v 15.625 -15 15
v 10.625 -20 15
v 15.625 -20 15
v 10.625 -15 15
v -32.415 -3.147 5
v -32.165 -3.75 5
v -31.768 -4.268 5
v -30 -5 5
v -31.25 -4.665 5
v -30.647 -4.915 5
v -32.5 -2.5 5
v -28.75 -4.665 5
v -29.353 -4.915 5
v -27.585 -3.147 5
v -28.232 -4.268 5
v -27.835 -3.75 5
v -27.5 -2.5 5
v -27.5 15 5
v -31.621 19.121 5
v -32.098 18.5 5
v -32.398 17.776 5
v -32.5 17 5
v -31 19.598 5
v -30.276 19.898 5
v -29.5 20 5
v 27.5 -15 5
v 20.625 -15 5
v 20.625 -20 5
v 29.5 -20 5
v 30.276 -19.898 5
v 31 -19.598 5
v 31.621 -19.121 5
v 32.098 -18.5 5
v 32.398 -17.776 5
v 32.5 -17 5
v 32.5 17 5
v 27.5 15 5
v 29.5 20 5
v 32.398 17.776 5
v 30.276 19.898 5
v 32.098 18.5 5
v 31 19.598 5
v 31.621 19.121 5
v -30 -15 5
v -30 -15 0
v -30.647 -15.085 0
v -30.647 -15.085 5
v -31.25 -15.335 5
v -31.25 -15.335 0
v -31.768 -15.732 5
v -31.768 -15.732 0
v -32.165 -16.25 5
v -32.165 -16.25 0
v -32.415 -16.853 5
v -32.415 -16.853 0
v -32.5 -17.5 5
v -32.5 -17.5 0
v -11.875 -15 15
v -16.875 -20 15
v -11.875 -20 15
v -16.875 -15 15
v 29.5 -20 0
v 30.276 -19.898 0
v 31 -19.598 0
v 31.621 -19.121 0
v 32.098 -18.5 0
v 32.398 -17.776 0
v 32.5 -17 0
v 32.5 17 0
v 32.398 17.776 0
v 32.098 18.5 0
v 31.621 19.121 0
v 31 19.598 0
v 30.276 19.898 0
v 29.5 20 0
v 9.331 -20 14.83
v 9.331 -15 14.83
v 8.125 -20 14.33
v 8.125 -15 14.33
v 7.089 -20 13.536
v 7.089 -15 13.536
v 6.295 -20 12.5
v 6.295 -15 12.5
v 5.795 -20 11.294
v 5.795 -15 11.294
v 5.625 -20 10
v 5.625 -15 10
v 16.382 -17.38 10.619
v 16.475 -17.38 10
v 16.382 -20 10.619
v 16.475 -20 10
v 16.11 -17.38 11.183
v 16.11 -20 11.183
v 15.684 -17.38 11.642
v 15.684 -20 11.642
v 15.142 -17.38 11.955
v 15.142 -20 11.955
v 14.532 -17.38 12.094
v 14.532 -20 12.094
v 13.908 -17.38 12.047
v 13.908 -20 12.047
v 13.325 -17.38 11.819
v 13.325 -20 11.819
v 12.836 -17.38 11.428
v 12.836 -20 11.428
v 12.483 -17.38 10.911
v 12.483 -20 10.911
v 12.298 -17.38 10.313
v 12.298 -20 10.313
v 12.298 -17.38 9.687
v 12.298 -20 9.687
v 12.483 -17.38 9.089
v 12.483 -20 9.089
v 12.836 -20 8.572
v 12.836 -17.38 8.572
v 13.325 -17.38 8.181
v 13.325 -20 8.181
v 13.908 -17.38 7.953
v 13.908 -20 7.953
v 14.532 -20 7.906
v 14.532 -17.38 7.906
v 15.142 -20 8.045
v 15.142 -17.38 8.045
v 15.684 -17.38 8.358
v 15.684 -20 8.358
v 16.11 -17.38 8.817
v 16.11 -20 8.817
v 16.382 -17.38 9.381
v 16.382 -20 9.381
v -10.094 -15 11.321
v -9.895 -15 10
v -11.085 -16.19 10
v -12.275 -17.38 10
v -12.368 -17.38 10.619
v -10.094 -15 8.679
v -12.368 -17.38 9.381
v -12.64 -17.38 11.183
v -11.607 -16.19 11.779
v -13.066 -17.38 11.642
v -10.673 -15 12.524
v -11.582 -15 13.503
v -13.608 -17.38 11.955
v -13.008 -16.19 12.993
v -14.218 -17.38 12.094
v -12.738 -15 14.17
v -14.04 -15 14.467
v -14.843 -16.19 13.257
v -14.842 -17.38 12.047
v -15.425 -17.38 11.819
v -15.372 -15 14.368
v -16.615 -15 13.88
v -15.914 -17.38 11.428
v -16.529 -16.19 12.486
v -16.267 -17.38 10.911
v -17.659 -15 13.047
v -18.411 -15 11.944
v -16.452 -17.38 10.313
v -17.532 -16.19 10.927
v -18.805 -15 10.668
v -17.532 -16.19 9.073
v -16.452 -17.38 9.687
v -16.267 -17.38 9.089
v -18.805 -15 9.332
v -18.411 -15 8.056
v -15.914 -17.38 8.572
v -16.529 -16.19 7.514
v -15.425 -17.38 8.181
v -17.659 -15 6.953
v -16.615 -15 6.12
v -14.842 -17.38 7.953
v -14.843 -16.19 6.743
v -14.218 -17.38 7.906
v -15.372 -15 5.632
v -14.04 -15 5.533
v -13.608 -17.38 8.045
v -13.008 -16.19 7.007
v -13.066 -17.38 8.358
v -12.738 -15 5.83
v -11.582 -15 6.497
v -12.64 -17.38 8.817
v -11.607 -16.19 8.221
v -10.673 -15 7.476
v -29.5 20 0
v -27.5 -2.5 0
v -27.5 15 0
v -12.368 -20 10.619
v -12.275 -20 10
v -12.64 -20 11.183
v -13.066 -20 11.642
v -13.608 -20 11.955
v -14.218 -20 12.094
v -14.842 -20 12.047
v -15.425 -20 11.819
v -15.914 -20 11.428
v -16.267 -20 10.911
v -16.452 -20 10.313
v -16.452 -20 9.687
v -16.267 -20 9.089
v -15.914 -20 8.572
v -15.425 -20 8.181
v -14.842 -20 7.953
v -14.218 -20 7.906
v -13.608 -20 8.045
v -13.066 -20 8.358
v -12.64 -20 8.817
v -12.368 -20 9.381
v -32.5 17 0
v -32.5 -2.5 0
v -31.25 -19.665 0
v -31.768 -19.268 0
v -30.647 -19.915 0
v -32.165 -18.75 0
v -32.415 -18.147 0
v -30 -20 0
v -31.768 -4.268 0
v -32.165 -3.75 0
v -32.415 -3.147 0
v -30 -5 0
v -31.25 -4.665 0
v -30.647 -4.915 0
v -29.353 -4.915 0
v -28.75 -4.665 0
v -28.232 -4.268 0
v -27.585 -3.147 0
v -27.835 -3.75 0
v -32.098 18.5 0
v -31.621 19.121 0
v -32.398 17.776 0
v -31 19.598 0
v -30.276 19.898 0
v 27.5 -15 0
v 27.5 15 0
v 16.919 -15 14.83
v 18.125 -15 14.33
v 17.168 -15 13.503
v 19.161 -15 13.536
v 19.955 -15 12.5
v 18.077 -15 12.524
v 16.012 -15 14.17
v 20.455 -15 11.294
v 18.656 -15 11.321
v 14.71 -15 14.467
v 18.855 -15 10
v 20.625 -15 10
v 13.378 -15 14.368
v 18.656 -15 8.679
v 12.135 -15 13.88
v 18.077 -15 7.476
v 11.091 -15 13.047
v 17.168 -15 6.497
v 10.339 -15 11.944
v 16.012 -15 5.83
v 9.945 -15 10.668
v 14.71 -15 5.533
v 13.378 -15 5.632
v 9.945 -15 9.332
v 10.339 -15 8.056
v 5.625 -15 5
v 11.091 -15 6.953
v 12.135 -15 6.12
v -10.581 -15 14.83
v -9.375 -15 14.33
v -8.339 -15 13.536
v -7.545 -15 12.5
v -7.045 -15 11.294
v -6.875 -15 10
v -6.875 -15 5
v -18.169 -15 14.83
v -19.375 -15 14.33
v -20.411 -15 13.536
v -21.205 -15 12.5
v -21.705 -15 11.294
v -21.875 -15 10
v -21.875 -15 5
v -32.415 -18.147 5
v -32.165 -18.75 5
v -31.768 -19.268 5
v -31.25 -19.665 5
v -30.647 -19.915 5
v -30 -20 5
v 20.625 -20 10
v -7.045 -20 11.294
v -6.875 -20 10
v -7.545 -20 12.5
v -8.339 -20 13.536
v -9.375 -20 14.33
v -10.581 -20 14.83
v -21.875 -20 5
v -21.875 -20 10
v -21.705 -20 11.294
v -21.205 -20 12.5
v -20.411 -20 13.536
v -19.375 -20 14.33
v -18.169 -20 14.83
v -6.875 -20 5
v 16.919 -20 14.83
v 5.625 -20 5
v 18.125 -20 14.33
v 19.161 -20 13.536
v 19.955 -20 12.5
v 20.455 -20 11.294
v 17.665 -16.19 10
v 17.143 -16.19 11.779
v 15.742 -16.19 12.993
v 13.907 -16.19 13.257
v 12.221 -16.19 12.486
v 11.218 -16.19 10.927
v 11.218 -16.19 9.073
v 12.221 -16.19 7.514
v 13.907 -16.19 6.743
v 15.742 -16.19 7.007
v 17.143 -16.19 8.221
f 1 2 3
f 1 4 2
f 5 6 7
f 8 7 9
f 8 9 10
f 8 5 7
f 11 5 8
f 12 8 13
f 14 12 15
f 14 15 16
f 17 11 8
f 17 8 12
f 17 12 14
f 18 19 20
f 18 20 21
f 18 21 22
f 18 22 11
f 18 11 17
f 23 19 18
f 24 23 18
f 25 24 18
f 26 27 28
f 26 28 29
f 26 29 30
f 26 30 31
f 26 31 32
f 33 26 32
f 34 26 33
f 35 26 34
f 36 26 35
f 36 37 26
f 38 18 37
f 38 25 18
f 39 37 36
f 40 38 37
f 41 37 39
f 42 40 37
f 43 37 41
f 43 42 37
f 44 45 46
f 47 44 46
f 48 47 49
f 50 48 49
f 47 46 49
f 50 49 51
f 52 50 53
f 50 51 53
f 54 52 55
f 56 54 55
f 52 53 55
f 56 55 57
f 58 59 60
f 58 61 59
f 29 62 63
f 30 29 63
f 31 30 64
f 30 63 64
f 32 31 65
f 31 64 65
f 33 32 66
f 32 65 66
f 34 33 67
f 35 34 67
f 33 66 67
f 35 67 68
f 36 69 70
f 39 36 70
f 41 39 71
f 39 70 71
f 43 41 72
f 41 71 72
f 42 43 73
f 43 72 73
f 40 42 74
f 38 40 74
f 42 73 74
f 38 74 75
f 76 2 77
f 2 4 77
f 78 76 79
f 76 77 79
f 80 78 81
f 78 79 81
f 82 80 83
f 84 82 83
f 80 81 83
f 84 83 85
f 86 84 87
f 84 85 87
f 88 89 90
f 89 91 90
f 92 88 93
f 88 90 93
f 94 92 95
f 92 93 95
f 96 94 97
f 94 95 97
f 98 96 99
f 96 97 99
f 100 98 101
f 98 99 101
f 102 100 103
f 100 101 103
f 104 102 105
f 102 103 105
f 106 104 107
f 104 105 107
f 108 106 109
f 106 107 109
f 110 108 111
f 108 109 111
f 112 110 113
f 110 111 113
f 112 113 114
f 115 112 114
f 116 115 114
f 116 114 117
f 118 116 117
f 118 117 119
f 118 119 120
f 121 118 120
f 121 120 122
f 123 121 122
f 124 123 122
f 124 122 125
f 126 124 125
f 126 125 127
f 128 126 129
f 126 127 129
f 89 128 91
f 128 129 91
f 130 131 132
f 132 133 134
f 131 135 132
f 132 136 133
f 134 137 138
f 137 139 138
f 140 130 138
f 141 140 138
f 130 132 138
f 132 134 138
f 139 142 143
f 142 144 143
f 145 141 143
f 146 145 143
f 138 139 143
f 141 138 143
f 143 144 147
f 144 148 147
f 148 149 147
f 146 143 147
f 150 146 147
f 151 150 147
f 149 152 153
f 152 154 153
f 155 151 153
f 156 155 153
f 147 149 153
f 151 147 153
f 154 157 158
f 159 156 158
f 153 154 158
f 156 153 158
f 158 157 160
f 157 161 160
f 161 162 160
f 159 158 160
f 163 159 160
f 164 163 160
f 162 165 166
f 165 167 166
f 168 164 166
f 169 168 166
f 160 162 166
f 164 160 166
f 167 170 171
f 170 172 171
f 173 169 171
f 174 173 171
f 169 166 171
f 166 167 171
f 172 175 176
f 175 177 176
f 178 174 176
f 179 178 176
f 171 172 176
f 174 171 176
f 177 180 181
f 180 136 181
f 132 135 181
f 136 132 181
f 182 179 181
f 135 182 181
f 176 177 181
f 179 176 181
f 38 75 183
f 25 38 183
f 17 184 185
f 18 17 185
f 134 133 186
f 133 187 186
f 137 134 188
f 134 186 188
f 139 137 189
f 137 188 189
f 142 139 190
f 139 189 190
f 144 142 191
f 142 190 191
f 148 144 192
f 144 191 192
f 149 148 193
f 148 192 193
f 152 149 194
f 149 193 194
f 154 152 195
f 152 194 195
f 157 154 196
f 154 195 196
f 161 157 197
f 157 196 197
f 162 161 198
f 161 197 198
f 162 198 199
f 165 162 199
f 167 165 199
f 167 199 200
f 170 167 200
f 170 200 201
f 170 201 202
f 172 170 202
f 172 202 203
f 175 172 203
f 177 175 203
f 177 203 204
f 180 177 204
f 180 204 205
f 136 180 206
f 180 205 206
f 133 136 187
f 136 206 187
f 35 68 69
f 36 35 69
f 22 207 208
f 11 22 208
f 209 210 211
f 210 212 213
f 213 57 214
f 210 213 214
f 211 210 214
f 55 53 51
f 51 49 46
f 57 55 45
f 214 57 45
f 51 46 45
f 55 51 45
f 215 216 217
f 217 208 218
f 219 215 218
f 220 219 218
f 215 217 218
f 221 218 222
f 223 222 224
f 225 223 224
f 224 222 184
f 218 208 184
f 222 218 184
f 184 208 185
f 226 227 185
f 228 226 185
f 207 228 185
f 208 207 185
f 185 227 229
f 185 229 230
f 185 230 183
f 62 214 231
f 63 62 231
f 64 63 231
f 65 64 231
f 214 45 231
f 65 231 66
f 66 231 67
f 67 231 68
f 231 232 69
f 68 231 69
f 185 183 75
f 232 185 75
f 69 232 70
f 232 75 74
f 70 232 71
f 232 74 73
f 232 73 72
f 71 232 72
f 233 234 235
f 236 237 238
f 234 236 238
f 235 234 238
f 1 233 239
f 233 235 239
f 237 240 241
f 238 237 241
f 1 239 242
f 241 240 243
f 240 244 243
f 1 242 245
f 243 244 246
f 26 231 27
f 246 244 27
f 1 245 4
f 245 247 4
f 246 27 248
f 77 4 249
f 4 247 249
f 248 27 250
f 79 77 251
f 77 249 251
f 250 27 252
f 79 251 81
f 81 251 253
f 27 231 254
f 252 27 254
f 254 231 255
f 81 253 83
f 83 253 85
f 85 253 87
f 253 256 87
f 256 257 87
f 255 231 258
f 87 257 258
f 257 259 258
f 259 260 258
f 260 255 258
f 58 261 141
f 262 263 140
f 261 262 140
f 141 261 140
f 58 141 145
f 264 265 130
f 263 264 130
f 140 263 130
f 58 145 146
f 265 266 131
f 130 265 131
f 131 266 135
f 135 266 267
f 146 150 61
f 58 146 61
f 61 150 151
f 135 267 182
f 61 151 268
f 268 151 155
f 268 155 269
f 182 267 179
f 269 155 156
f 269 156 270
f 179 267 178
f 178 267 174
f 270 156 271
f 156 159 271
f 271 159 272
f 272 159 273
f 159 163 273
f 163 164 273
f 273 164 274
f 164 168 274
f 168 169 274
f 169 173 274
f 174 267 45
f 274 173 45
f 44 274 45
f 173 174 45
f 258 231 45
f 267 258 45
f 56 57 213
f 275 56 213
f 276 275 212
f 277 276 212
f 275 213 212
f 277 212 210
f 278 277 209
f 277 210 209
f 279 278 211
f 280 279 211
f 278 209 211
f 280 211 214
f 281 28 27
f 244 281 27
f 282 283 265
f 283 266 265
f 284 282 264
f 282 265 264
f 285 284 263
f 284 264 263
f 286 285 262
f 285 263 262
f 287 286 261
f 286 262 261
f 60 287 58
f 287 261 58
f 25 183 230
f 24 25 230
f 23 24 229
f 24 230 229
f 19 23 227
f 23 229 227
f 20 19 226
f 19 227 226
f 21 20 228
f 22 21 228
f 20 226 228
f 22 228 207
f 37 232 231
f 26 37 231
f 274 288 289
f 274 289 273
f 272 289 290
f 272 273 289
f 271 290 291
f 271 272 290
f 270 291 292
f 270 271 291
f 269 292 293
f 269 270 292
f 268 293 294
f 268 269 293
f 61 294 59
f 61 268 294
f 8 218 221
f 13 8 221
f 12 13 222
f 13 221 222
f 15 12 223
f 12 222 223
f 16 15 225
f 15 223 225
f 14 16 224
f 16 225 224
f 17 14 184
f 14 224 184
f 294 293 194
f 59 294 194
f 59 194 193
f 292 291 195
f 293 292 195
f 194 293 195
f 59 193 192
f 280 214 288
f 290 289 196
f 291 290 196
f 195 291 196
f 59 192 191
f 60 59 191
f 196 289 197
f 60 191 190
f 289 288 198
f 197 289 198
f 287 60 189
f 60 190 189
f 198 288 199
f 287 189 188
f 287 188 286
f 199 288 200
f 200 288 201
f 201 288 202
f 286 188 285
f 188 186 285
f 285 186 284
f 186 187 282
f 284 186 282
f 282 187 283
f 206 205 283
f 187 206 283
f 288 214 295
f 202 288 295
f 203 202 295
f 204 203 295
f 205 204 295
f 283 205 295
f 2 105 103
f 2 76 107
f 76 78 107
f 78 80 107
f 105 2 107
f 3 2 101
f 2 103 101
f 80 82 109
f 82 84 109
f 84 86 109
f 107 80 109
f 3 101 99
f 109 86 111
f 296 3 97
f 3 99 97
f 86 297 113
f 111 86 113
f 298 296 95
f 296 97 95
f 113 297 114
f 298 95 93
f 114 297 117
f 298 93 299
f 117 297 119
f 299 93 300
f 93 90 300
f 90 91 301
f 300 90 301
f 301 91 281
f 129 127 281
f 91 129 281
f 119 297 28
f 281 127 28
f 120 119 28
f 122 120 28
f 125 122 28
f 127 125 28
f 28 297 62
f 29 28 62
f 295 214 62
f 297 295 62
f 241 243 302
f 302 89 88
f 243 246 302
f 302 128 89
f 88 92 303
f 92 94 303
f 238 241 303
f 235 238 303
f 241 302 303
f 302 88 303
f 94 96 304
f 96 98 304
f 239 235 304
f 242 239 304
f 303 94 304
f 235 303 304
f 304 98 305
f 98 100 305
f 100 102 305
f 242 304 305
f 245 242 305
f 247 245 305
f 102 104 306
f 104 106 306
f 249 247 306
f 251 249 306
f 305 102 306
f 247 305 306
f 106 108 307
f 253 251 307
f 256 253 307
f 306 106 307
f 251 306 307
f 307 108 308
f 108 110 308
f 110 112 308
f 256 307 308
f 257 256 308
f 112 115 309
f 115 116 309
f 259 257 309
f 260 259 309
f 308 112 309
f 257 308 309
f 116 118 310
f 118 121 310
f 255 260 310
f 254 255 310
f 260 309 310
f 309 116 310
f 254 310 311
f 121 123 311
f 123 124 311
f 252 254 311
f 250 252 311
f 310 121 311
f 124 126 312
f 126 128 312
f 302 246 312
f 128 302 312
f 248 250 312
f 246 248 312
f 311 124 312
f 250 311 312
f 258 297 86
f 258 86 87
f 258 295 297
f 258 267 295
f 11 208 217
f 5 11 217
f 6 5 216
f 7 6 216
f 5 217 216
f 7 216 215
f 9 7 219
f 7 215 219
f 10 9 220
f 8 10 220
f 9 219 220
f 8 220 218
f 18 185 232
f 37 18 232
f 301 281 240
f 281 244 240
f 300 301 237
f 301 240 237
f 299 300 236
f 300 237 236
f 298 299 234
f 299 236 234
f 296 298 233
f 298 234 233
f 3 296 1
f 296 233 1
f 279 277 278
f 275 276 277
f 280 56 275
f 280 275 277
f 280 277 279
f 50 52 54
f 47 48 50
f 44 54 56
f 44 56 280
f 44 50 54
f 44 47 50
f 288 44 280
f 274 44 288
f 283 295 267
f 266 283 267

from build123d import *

# Parameters (mm, degrees)
F1_DEPTH       = 5
F2_W           = 15
F2_H           = 5
F3_DEPTH       = 10
F4_R           = 5
F6_D           = 4.2
F6_CSINK_D     = 8.96
F6_CSINK_ANGLE = 90


with BuildPart() as f1:
    # F0 (on Top) → F1 (new body)
    with BuildSketch(Plane.XY):
        with BuildLine():
            Line((29.5, 20), (-29.5, 20))
            ThreePointArc((-29.5, 20), (-31.62132, 19.12132), (-32.5, 17))
            Line((-32.5, 17), (-32.5, -2.5))
            ThreePointArc((-32.5, -2.5), (-31.767767, -4.267767), (-30, -5))
            ThreePointArc((-30, -5), (-28.232233, -4.267767), (-27.5, -2.5))
            Line((-27.5, -2.5), (-27.5, 15))
            Line((-27.5, 15), (27.5, 15))
            Line((27.5, 15), (27.5, -15))
            Line((27.5, -15), (-27.5, -15))
            Line((-27.5, -15), (-30, -15))
            ThreePointArc((-30, -15), (-31.767767, -15.732233), (-32.5, -17.5))
            ThreePointArc((-32.5, -17.5), (-31.767767, -19.267767), (-30, -20))
            Line((-30, -20), (29.5, -20))
            ThreePointArc((29.5, -20), (31.62132, -19.12132), (32.5, -17))
            Line((32.5, -17), (32.5, 17))
            ThreePointArc((32.5, 17), (31.62132, 19.12132), (29.5, 20))
        make_face()
    extrude(amount=F1_DEPTH)

    # F2 (on face) → F3 (join)
    with BuildSketch(Plane.XY.offset(5)):
        with Locations((-14.375, -17.5)):
            Rectangle(F2_W, F2_H)
        with Locations((13.125, -17.5)):
            Rectangle(F2_W, F2_H)
    extrude(amount=F3_DEPTH)

    # F4
    f4_edges = [f1.edges().sort_by_distance(p)[0] for p in [
        (-21.875, -17.5, 15),
        (-6.875, -17.5, 15),
        (5.625, -17.5, 15),
        (20.625, -17.5, 15),
    ]]
    fillet(f4_edges, radius=F4_R)

    # F6 (through all)
    with Locations(Plane(origin=(0, -15, 0), x_dir=(-1, 0, 0), z_dir=(0, 1, 0))):
        with Locations((14.375, 10), (-14.375, 10)):
            CounterSinkHole(F6_D / 2, F6_CSINK_D / 2, counter_sink_angle=F6_CSINK_ANGLE)


solid = f1.part
